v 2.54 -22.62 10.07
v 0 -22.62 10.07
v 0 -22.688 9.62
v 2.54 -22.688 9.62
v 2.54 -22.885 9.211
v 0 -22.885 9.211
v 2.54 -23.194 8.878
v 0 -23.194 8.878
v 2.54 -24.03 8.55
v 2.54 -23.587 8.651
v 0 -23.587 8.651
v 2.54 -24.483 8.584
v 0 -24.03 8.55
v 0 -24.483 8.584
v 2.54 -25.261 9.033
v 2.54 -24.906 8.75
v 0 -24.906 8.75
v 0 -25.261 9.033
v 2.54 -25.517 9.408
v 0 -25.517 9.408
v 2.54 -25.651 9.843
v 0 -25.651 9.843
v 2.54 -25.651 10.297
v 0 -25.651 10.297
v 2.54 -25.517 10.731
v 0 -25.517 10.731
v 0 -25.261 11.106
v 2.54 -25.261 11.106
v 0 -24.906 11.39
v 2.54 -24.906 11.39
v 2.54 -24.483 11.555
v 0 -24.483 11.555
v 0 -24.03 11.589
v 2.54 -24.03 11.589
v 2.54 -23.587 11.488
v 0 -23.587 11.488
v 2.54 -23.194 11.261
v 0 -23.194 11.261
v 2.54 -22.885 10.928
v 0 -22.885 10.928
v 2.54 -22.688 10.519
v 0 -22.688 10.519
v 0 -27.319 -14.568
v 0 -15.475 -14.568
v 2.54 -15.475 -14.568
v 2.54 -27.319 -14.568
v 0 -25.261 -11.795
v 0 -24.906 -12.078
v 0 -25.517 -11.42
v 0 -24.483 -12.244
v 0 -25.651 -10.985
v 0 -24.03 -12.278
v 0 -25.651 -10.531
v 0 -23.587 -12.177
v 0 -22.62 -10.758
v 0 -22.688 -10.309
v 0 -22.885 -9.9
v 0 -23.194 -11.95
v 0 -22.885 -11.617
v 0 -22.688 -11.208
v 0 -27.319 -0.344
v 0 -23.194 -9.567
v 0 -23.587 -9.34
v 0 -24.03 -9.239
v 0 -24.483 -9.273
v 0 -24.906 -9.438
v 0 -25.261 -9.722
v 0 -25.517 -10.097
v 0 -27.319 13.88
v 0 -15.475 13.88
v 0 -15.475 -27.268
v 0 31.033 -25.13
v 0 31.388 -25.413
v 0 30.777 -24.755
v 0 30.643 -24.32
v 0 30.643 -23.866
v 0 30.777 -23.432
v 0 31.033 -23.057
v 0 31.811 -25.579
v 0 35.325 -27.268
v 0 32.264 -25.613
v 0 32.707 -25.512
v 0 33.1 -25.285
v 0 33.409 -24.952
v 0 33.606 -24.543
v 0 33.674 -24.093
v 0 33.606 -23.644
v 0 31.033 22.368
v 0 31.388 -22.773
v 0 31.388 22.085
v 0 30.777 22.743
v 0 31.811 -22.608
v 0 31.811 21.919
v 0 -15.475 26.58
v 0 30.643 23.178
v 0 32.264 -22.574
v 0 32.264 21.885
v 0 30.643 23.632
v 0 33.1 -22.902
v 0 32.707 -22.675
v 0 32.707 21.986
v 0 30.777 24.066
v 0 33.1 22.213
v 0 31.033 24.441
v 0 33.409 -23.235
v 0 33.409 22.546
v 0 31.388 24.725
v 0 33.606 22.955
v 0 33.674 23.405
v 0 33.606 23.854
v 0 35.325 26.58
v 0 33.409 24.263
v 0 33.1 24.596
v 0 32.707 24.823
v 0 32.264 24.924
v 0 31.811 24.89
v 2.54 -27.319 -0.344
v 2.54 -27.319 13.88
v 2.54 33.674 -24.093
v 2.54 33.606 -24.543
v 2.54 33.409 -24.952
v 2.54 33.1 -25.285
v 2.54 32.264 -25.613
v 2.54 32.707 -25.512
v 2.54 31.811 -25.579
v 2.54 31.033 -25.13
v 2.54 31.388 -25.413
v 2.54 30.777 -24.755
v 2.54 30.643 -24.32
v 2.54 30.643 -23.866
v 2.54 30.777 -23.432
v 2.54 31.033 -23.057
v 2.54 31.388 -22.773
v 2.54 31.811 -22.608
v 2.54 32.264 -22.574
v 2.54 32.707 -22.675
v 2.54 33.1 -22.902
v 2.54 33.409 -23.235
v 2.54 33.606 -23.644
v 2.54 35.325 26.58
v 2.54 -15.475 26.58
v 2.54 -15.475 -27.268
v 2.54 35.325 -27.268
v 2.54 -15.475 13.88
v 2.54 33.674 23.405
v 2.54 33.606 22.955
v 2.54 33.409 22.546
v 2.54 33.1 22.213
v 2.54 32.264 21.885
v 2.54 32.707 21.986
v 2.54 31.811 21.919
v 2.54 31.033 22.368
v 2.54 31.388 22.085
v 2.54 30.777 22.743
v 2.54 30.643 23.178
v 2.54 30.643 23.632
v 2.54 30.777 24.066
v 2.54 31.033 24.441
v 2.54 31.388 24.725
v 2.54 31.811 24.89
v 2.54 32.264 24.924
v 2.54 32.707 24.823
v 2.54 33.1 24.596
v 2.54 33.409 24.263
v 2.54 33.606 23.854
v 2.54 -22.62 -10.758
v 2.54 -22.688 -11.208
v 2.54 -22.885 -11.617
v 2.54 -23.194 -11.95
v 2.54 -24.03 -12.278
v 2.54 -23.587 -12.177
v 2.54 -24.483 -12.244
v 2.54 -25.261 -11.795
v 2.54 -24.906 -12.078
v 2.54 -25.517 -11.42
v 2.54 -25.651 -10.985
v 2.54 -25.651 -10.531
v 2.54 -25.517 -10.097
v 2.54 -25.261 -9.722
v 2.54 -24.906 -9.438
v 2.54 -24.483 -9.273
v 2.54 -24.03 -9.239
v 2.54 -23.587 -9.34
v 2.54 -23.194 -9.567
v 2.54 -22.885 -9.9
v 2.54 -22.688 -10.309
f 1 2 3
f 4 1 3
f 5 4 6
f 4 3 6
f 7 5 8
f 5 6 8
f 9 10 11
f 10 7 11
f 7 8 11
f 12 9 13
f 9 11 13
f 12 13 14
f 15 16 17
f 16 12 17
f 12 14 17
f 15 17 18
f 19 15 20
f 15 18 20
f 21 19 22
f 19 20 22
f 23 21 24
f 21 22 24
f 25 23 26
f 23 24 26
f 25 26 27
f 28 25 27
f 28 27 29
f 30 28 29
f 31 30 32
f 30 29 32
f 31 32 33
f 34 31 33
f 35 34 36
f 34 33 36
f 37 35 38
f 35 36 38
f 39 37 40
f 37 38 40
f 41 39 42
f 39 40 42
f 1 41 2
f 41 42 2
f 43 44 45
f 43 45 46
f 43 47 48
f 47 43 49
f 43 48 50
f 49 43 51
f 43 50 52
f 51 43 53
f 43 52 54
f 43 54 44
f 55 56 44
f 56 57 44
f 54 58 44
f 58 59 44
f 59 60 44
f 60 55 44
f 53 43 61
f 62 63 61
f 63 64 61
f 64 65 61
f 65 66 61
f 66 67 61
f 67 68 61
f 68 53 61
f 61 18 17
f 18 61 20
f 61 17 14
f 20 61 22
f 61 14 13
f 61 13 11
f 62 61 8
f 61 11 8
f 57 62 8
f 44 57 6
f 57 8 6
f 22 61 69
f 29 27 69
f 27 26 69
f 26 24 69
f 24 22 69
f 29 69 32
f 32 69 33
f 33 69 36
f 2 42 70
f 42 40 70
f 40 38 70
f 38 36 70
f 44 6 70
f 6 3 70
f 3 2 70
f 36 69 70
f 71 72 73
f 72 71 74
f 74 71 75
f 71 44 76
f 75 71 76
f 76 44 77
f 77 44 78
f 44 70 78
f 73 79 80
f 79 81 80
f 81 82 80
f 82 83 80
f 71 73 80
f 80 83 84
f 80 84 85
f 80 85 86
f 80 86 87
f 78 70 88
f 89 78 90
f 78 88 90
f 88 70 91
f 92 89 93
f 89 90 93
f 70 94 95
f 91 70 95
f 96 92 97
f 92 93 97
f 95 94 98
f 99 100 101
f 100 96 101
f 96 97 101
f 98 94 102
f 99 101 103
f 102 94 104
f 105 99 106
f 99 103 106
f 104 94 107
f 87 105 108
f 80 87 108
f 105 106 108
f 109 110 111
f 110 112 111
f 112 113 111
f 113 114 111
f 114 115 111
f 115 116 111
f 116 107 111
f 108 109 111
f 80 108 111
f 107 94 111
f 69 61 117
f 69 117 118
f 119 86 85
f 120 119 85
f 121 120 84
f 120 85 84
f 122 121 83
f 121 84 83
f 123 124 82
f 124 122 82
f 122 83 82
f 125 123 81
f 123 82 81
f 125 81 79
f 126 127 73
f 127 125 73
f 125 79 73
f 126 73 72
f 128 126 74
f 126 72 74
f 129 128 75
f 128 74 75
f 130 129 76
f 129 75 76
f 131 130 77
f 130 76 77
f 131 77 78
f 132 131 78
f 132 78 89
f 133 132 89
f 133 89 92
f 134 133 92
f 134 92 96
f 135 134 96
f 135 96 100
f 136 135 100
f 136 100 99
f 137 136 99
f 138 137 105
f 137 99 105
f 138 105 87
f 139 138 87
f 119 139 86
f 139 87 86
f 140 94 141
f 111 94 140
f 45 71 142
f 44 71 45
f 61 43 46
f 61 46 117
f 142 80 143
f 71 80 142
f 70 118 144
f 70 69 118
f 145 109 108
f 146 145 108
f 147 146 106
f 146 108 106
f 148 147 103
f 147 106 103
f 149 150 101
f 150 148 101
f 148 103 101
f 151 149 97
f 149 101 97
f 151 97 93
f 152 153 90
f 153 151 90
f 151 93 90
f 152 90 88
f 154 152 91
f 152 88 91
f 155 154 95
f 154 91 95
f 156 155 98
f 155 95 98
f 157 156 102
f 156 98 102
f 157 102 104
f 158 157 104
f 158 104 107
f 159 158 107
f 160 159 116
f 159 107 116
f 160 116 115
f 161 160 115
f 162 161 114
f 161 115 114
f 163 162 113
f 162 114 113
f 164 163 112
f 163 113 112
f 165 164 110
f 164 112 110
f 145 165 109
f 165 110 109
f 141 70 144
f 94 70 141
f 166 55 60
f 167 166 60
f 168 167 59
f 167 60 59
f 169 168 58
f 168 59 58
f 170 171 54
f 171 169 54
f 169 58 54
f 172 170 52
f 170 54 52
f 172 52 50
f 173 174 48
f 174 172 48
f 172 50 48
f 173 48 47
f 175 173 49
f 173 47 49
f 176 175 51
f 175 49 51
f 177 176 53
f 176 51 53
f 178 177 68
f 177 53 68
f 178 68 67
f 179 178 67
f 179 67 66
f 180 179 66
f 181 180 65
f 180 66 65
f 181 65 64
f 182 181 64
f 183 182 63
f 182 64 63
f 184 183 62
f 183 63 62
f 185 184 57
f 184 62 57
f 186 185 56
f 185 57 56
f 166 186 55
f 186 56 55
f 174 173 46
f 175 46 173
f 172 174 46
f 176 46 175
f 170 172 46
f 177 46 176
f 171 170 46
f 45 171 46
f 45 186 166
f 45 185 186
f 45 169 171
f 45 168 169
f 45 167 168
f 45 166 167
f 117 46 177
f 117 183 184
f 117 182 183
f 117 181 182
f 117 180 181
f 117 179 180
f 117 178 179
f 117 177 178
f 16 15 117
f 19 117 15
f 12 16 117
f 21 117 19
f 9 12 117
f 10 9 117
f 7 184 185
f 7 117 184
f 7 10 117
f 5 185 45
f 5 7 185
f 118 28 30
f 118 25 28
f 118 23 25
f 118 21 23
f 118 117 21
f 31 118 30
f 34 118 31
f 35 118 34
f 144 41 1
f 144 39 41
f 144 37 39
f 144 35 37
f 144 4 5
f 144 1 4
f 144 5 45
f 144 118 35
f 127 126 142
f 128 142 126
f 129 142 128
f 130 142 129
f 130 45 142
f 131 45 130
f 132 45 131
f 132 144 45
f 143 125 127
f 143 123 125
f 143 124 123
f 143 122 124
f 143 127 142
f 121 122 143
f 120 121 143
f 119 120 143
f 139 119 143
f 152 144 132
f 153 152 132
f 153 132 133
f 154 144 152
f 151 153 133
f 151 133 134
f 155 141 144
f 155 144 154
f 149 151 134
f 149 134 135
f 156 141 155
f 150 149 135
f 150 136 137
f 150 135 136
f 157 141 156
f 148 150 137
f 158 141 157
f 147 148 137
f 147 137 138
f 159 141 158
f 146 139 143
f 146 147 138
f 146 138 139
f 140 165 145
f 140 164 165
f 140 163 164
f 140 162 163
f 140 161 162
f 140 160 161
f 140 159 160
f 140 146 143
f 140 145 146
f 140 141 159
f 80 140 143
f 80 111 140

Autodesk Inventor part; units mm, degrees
ref_plane "YZ Plane" through (0, 0, 0) normal (1, 0, 0) x (0, 1, 0)
ref_plane "XZ Plane" through (0, 0, 0) normal (0, 1, 0) x (-1, 0, 0)
ref_plane "XY Plane" through (0, 0, 0) normal (0, 0, 1) x (1, 0, 0)
sketch "Sketch1" plane through (0, 0, 0) normal (1, 0, 0) x (0, 1, 0)
  line L0 (35.3248, 26.5797) -> (35.3248, -27.2683)
  line L1 (35.3248, -27.2683) -> (-15.4752, -27.2683)
  line L2 (-15.4752, -27.2683) -> (-15.4752, -14.5683)
  line L3 (-15.4752, -14.5683) -> (-27.319, -14.5683)
  line L4 (-27.319, -14.5683) -> (-27.319, 13.8797)
  line L5 (-27.319, 13.8797) -> (-15.4752, 13.8797)
  line L6 (-15.4752, 13.8797) -> (-15.4752, 26.5797)
  line L7 (-15.4752, 26.5797) -> (35.3248, 26.5797)
  line L8 (-27.319, -0.3443) -> (-33.7293, -0.3443)
  circle A0 centre (32.1498, 23.4047) radius 1.524
  circle A1 centre (32.1498, -24.0933) radius 1.524
  circle A2 centre (-24.144, -10.7583) radius 1.524
  circle A3 centre (-24.144, 10.0697) radius 1.524
  point P0 (0, 0)
  dimension "d0" = 53.848
  dimension "d1" = 12.7
  dimension "d2" = 12.7
  dimension "d3" = 26.924
  dimension "d4" = 50.8
  dimension "d5" = 3.048
  dimension "d6" = 3.048
  dimension "d7" = 3.048
  dimension "d8" = 3.048
  dimension "d9" = 3.175
  dimension "d10" = 3.175
  dimension "d11" = 3.175
  dimension "d12" = 3.175
  dimension "d13" = 16.51
  dimension "d14" = 16.51
  dimension "d15" = 3.175
  dimension "d16" = 3.175
extrude "Extrusion1" add sketch "Sketch1" along normal blind 2.54
properties part number "pixy"
